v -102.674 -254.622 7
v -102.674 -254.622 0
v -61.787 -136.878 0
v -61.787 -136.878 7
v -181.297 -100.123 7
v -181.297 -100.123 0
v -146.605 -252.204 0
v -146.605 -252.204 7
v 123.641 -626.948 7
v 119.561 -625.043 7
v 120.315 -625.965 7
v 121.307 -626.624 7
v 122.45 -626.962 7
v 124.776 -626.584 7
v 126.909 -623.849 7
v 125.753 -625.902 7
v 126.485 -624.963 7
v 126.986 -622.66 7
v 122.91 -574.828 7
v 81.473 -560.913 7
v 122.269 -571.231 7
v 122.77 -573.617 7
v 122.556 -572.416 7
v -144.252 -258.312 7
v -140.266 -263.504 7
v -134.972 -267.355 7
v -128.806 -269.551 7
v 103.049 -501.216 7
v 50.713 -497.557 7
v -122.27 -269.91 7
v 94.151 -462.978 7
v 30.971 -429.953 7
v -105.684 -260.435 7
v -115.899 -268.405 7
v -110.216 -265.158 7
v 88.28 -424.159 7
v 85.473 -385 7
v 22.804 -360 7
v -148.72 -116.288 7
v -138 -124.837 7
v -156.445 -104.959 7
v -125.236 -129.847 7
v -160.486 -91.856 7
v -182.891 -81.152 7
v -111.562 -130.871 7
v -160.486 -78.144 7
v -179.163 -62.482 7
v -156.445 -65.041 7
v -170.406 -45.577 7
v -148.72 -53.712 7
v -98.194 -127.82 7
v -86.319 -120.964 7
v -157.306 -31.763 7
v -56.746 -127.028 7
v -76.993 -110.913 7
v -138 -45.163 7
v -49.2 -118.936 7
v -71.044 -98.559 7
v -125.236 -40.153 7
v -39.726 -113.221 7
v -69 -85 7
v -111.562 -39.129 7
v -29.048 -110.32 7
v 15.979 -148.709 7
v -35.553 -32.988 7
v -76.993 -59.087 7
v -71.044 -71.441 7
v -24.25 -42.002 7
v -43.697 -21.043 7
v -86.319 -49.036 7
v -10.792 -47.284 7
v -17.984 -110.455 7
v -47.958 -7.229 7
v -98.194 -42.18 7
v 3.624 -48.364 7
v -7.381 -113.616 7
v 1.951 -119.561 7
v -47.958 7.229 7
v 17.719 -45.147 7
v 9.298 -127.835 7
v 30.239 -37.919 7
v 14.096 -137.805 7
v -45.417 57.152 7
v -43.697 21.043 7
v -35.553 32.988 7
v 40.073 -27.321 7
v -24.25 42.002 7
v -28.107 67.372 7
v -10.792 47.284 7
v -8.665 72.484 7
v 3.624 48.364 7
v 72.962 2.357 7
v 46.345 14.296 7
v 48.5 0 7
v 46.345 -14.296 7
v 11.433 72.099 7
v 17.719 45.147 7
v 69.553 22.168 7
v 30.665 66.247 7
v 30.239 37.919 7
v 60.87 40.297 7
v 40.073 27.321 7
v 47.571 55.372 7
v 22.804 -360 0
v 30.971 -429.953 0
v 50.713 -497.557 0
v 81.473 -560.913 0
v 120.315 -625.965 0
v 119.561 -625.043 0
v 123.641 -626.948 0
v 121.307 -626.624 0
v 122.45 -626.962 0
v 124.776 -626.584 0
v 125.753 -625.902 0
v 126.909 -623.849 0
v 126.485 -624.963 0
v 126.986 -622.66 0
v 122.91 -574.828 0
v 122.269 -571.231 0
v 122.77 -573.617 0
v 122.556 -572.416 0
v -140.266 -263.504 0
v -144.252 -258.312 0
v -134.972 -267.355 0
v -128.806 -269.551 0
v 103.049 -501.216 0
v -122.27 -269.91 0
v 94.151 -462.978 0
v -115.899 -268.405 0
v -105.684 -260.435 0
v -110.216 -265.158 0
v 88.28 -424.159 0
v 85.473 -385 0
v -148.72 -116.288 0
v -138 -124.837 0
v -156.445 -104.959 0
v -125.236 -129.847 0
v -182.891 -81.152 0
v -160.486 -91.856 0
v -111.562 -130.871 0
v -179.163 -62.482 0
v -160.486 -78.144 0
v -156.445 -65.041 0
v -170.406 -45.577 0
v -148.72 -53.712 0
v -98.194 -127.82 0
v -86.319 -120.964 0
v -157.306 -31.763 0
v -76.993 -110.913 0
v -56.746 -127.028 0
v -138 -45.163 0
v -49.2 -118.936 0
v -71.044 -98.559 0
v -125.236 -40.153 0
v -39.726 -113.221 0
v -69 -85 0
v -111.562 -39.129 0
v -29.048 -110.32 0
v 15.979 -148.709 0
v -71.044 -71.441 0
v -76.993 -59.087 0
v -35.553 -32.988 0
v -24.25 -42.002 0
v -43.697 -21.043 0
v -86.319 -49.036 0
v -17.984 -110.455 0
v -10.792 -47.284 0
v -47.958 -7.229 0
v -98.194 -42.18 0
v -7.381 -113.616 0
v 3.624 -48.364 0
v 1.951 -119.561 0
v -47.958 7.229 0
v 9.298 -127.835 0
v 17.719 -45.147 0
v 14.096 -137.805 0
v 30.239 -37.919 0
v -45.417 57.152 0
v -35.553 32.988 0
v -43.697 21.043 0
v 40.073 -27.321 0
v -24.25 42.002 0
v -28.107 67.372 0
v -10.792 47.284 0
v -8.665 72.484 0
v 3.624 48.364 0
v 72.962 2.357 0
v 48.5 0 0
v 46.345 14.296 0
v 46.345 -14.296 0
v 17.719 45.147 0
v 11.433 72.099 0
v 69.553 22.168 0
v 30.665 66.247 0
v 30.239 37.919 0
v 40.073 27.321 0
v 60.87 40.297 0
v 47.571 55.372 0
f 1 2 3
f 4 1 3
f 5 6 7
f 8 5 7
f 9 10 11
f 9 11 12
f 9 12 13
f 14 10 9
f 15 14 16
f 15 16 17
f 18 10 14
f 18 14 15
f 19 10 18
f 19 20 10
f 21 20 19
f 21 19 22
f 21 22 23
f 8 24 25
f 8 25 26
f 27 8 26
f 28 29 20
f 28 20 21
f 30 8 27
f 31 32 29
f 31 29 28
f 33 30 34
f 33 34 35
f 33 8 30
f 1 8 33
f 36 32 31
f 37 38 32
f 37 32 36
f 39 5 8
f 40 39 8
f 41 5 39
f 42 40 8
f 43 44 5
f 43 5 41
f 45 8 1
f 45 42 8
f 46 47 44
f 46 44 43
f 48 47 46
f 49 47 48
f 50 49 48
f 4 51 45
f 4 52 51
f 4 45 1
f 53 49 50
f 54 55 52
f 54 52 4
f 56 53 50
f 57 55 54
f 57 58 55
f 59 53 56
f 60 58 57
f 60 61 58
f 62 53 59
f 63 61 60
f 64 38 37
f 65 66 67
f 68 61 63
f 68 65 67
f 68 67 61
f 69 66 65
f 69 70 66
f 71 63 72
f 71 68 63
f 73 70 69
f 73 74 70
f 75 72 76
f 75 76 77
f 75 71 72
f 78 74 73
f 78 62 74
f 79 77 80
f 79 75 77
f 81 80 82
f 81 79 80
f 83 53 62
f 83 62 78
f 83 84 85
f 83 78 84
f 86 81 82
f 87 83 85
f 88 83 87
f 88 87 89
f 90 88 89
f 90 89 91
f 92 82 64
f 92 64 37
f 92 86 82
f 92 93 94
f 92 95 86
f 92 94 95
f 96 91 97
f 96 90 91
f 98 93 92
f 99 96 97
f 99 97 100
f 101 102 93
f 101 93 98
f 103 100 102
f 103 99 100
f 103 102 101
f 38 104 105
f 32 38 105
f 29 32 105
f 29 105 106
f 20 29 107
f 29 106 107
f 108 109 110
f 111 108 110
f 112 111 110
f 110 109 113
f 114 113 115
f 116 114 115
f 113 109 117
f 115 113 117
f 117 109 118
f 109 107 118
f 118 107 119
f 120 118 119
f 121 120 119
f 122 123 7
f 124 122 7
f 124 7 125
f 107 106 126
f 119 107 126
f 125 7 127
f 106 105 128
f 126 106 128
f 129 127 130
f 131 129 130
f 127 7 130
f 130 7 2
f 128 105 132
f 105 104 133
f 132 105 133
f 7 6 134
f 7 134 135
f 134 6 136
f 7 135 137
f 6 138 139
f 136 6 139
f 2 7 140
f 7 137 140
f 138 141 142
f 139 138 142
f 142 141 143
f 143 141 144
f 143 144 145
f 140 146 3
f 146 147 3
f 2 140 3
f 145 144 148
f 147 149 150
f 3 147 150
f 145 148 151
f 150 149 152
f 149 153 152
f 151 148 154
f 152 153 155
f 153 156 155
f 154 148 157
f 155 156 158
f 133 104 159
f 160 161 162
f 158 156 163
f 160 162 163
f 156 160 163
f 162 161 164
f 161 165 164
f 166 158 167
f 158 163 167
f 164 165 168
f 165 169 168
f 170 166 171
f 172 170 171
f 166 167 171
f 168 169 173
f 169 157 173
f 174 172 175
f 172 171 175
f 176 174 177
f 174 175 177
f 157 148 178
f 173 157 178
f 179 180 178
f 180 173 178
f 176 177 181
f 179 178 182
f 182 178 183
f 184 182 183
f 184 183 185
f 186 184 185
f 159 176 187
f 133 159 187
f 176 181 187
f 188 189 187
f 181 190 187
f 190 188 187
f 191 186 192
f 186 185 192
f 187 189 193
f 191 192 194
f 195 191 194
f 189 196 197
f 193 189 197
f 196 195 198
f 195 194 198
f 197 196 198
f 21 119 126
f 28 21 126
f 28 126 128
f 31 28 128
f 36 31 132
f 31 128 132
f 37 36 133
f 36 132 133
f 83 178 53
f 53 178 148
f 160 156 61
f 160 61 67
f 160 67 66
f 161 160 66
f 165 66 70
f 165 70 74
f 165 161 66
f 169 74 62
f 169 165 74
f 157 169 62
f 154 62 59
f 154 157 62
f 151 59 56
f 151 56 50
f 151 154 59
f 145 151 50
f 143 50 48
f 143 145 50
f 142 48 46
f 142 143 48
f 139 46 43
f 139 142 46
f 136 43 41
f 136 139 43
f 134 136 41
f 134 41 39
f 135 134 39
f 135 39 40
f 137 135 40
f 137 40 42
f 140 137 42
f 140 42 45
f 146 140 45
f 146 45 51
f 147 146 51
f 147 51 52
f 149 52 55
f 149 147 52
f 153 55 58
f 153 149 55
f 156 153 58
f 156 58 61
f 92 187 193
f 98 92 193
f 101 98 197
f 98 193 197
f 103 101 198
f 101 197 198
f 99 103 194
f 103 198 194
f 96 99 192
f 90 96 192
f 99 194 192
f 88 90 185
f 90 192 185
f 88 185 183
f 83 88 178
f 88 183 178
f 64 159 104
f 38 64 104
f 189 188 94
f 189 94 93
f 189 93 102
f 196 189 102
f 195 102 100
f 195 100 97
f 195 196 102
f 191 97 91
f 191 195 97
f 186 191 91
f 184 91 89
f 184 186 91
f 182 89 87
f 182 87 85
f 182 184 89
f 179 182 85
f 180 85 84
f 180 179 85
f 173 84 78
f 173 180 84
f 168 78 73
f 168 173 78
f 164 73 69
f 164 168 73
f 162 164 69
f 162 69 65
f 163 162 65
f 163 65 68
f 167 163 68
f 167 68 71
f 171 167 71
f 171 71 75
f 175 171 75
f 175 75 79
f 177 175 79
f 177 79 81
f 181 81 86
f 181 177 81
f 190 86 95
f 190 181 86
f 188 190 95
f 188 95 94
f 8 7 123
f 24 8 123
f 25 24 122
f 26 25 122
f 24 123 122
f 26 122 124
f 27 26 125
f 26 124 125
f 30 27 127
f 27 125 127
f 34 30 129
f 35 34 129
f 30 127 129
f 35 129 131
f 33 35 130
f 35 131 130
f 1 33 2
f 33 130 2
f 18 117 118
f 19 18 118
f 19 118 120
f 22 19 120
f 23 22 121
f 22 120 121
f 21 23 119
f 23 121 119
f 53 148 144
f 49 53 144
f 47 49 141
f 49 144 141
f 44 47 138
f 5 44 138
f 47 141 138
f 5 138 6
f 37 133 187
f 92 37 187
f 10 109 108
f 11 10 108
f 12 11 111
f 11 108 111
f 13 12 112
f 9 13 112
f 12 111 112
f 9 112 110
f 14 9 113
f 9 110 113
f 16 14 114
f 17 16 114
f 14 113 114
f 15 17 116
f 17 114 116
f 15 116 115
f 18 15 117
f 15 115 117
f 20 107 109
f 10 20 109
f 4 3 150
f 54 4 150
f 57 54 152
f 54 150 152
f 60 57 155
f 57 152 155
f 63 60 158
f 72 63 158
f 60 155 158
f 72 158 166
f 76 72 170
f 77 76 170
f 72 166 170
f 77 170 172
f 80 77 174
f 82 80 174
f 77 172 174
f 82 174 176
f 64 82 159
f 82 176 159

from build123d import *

# Parameters (mm, degrees)
SKETCH1_R      = 48.5
SKETCH1_R_2    = 46
EXTRUDE1_DEPTH = 7


with BuildPart() as part:
    # Sketch1 → Extrude1 (new body)
    with BuildSketch(Plane.XY):
        with BuildLine():
            Line((-181.296983893, -100.123158622), (-146.60541801, -252.204231237))
            ThreePointArc((-146.60541801, -252.204231237), (-125.550644715, -269.965422259), (-102.674010073, -254.621922903))
            Line((-102.674010073, -254.621922903), (-61.786520036, -136.878304089))
            ThreePointArc((-61.786520036, -136.878304089), (-17.984074435, -110.454979585), (15.979150749, -148.708680759))
            Line((15.979150749, -148.708680759), (22.803821631, -360))
            ThreePointArc((22.803821631, -360), (39.422409163, -464.1696592), (81.472905946, -560.912881546))
            Line((81.472905946, -560.912881546), (119.560838109, -625.042587939))
            ThreePointArc((119.560838109, -625.042587939), (124.22199896, -626.808768638), (126.985562325, -622.660451839))
            Line((126.985562325, -622.660451839), (122.910471509, -574.827683832))
            ThreePointArc((122.910471509, -574.827683832), (122.67212546, -573.014734487), (122.269195455, -571.231130949))
            Line((122.269195455, -571.231130949), (103.049494252, -501.215851748))
            ThreePointArc((103.049494252, -501.215851748), (90.834692996, -443.626181209), (85.473499156, -385))
            Line((85.473499156, -385), (72.961950117, 2.356657615))
            ThreePointArc((72.961950117, 2.356657615), (30.664556943, 66.247150486), (-45.416584246, 57.151849274))
            Line((-45.416584246, 57.151849274), (-157.305859298, -31.76266095))
            ThreePointArc((-157.305859298, -31.76266095), (-179.163336866, -62.481869477), (-181.296983893, -100.123158622))
        make_face()
        Circle(SKETCH1_R, mode=Mode.SUBTRACT)
        with Locations((-115, -85)):
            Circle(SKETCH1_R_2, mode=Mode.SUBTRACT)
    extrude(amount=EXTRUDE1_DEPTH)


solid = part.part
